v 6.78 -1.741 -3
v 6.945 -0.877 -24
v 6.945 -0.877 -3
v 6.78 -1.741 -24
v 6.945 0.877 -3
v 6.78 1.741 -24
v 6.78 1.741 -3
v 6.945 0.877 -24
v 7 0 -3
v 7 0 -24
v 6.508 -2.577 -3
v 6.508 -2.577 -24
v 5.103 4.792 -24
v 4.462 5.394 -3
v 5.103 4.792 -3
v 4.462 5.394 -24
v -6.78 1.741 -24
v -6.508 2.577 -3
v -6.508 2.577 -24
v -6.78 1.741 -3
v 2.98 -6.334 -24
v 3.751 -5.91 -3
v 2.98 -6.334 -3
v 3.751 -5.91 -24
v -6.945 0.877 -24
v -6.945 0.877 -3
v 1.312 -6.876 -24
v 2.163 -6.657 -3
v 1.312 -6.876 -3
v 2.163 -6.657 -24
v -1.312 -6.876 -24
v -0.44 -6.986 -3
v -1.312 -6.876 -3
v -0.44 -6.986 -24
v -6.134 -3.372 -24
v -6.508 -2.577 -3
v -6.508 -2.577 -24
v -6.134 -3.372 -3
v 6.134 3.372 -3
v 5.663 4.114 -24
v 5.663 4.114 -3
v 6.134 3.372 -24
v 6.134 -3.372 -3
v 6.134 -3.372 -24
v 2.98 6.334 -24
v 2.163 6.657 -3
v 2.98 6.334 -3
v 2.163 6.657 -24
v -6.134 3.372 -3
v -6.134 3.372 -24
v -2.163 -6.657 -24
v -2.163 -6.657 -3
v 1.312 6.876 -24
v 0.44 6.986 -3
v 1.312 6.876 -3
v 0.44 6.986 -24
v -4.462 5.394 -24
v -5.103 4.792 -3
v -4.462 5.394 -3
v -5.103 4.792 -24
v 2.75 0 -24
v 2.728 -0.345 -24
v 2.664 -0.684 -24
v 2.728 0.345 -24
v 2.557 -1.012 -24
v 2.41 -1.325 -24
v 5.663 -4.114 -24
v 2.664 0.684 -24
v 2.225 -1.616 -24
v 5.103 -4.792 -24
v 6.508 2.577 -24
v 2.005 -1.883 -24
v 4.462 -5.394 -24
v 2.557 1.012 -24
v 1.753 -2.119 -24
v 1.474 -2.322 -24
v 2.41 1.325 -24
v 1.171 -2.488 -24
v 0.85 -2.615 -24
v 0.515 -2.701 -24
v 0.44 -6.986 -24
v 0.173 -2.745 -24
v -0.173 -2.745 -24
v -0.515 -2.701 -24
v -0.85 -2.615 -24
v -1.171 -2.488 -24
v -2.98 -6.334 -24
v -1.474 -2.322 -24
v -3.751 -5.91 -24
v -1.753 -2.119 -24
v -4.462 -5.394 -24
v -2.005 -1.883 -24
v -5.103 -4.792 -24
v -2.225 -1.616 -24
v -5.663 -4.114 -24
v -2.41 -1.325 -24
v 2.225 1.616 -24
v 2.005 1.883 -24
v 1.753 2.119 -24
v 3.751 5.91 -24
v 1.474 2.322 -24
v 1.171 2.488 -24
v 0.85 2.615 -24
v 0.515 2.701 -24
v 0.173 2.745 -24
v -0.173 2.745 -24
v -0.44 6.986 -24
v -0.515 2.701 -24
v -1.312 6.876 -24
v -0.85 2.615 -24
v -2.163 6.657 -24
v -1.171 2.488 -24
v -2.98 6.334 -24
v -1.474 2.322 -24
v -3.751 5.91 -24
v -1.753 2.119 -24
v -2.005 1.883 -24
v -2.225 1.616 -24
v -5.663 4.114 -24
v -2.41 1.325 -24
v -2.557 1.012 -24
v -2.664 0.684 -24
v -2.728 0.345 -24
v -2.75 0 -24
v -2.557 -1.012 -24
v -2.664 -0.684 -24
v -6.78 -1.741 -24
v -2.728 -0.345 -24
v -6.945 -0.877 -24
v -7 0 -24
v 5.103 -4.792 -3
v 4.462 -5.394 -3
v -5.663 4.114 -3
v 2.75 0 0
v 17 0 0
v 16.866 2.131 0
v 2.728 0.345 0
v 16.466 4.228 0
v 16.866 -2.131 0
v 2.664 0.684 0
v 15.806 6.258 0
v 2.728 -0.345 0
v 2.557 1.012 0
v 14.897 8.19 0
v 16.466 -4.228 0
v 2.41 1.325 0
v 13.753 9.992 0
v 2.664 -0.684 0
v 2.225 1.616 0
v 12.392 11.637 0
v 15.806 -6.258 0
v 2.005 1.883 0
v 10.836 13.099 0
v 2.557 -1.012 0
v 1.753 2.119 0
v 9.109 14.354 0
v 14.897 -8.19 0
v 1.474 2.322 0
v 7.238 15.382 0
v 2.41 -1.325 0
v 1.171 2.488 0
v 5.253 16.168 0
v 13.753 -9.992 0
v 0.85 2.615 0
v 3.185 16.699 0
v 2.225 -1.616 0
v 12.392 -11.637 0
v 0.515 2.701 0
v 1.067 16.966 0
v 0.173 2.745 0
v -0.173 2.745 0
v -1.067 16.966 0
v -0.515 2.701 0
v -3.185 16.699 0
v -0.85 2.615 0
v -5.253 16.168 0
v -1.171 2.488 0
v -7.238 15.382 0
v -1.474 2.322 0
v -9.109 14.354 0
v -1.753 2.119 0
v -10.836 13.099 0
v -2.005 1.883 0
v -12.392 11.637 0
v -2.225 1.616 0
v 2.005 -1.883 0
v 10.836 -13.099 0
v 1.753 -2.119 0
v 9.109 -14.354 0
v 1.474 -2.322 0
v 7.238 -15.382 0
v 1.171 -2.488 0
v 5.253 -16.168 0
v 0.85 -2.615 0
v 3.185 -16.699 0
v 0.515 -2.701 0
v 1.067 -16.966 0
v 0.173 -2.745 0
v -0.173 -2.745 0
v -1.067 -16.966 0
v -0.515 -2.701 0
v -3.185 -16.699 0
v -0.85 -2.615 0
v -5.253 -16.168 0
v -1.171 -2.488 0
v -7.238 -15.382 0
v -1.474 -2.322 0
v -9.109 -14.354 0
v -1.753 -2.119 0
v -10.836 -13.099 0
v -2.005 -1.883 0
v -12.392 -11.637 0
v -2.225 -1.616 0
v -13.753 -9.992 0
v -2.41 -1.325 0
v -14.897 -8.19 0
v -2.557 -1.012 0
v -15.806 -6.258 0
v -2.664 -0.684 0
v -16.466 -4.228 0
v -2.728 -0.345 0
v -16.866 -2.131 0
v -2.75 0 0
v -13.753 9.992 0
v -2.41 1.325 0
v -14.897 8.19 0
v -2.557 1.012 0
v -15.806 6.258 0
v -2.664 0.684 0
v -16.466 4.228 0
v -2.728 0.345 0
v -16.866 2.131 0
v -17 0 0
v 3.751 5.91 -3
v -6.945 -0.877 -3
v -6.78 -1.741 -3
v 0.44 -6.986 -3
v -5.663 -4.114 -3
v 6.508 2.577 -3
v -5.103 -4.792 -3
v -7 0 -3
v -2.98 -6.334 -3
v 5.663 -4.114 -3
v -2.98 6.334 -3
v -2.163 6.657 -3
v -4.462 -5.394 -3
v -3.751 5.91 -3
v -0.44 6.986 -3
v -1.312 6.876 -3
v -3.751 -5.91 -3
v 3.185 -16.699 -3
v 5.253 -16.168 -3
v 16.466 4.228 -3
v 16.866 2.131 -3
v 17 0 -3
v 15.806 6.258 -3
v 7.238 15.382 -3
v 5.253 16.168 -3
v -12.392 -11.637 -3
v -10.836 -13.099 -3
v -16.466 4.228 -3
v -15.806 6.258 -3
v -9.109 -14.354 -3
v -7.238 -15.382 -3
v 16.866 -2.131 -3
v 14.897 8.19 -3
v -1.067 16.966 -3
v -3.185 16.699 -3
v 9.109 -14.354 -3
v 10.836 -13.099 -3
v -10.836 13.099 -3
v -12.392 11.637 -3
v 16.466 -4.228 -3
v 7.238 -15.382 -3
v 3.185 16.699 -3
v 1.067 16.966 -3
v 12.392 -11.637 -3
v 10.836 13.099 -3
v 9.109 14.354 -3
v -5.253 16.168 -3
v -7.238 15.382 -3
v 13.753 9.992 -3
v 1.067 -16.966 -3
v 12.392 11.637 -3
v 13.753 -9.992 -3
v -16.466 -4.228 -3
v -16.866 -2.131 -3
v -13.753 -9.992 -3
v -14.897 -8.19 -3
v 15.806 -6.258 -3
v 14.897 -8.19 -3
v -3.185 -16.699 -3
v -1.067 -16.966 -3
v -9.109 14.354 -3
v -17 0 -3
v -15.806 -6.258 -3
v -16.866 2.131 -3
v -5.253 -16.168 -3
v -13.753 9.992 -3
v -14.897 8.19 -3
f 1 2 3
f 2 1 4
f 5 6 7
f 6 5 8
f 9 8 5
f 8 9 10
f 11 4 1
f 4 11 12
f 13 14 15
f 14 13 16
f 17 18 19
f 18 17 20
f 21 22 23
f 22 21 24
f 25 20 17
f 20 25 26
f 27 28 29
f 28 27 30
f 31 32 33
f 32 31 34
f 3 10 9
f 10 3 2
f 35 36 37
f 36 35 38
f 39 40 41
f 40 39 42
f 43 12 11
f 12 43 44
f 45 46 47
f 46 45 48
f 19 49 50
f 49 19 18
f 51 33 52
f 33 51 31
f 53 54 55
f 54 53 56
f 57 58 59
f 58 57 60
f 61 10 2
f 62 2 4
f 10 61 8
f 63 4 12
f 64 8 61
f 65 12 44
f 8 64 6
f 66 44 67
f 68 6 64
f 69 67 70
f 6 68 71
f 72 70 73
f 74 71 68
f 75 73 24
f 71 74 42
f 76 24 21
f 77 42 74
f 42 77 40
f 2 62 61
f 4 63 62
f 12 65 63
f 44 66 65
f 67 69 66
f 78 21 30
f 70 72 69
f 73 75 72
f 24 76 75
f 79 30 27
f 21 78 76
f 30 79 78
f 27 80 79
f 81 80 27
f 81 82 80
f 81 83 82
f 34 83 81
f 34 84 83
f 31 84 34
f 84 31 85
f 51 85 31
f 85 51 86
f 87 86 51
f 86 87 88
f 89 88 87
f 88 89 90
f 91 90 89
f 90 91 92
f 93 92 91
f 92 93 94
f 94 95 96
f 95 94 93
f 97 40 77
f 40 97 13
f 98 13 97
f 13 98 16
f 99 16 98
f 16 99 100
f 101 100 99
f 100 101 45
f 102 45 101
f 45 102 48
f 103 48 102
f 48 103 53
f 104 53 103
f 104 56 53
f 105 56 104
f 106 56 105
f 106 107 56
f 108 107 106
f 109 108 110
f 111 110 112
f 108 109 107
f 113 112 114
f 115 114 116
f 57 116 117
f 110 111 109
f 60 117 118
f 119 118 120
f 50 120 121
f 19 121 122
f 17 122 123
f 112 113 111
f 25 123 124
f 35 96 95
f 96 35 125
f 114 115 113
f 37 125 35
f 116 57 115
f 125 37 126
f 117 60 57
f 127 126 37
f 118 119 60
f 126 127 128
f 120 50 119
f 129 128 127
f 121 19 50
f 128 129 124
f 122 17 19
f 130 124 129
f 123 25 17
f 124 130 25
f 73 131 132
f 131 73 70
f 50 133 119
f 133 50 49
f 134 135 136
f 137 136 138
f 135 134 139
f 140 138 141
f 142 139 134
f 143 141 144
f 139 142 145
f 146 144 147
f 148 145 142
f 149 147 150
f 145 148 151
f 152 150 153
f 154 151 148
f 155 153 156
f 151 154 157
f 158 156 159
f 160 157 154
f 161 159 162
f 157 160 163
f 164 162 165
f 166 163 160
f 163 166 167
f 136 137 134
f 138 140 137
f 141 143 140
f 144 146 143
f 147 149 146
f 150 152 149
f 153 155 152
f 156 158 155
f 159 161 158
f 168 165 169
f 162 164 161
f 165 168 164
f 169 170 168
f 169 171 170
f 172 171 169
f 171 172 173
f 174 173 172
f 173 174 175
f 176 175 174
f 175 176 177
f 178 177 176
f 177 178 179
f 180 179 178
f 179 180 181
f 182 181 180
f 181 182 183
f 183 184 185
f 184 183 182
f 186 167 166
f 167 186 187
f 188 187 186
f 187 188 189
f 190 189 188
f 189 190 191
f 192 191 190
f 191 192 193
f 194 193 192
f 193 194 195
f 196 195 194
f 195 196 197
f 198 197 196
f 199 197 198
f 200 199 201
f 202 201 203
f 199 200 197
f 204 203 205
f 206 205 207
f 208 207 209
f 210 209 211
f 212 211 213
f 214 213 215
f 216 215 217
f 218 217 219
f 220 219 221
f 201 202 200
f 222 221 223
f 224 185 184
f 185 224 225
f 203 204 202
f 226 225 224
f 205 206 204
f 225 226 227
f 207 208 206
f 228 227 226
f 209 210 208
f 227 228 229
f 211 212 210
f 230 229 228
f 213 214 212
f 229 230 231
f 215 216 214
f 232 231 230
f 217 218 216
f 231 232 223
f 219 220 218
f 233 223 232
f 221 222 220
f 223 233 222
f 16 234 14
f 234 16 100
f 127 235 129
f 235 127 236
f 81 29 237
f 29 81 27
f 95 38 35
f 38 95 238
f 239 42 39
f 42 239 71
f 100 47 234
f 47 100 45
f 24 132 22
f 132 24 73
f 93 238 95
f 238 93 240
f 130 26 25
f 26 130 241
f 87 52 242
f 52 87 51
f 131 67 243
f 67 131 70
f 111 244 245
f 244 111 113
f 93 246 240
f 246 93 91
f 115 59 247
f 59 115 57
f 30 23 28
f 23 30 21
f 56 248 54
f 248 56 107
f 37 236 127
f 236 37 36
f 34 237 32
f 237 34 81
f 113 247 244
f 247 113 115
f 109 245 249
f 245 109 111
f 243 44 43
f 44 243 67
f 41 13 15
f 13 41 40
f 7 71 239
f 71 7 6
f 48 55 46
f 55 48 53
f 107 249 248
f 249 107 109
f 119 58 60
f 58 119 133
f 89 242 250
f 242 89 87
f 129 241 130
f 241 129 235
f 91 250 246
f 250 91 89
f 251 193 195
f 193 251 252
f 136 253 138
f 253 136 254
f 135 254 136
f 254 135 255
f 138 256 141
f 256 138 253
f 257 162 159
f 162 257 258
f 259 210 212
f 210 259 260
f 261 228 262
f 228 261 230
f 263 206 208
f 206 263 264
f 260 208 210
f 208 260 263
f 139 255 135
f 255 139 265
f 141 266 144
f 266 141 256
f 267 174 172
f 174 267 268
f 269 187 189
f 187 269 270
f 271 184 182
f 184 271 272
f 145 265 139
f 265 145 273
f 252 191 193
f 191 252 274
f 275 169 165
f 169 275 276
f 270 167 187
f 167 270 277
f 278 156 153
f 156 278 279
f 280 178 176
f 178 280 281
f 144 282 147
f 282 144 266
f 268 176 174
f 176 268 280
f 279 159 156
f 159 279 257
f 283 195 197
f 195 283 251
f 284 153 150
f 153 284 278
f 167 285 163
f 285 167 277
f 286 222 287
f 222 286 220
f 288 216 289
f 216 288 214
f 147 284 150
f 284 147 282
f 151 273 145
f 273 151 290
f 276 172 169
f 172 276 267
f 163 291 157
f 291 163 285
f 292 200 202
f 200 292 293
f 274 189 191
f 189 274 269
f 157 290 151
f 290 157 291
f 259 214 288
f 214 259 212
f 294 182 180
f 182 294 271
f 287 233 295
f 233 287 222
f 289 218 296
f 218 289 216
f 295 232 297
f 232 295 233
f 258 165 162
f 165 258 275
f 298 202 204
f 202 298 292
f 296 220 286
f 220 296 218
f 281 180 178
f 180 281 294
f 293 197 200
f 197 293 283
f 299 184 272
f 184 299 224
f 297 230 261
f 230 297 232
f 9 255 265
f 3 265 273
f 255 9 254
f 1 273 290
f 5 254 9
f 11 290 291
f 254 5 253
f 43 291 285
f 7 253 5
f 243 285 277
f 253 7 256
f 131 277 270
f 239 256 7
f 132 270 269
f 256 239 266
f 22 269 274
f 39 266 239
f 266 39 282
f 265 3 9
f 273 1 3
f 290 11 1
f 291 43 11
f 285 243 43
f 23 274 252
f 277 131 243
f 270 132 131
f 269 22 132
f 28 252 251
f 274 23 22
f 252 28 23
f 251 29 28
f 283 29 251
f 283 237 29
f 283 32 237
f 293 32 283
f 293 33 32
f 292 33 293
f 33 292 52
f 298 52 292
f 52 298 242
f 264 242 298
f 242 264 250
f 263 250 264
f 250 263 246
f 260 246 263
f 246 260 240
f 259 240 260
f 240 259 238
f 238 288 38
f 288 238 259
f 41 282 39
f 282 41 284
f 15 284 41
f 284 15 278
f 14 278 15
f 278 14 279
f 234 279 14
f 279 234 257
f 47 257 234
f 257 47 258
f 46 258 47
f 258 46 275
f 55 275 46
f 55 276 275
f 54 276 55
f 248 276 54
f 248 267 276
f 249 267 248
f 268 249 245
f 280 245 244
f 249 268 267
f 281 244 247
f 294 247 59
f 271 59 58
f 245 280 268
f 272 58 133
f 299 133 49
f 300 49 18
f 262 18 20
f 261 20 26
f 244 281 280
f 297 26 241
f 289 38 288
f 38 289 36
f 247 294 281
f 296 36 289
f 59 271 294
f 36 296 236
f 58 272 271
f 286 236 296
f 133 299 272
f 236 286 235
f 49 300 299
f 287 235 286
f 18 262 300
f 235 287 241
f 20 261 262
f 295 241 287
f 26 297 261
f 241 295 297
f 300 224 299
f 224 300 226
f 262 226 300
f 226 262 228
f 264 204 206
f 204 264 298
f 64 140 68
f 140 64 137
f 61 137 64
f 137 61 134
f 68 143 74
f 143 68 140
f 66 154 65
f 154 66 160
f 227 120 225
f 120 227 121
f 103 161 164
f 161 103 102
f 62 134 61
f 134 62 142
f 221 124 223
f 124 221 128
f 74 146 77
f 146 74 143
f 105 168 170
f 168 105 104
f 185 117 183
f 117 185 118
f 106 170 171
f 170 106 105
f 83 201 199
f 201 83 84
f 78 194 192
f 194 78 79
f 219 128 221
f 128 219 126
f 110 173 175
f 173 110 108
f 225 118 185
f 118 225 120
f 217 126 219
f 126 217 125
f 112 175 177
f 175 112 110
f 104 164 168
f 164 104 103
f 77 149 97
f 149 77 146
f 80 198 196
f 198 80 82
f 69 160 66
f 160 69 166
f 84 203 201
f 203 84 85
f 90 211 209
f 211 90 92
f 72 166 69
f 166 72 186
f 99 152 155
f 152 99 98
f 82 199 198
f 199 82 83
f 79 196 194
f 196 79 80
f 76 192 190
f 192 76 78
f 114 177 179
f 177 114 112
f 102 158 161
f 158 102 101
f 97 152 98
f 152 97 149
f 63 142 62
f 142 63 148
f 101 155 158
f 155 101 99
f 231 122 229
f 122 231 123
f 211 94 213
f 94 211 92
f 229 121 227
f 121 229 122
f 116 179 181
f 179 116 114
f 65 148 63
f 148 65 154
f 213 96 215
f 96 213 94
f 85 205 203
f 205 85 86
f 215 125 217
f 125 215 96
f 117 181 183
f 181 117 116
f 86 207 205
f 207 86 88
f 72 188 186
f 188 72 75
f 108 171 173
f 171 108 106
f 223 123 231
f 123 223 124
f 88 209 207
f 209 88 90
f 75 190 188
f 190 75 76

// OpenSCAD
$fn = 50;


difference() {
	union() {
		translate(v = [0, 0, -24.0000000000]) {
			cylinder(h = 24, r = 7.0000000000);
		}
		translate(v = [0, 0, -3.0000000000]) {
			cylinder(h = 3, r = 17.0000000000);
		}
	}
	union() {
		#translate(v = [0, 0, -24]) {
			cylinder(h = 24, r = 2.7500000000);
		}
	}
}
